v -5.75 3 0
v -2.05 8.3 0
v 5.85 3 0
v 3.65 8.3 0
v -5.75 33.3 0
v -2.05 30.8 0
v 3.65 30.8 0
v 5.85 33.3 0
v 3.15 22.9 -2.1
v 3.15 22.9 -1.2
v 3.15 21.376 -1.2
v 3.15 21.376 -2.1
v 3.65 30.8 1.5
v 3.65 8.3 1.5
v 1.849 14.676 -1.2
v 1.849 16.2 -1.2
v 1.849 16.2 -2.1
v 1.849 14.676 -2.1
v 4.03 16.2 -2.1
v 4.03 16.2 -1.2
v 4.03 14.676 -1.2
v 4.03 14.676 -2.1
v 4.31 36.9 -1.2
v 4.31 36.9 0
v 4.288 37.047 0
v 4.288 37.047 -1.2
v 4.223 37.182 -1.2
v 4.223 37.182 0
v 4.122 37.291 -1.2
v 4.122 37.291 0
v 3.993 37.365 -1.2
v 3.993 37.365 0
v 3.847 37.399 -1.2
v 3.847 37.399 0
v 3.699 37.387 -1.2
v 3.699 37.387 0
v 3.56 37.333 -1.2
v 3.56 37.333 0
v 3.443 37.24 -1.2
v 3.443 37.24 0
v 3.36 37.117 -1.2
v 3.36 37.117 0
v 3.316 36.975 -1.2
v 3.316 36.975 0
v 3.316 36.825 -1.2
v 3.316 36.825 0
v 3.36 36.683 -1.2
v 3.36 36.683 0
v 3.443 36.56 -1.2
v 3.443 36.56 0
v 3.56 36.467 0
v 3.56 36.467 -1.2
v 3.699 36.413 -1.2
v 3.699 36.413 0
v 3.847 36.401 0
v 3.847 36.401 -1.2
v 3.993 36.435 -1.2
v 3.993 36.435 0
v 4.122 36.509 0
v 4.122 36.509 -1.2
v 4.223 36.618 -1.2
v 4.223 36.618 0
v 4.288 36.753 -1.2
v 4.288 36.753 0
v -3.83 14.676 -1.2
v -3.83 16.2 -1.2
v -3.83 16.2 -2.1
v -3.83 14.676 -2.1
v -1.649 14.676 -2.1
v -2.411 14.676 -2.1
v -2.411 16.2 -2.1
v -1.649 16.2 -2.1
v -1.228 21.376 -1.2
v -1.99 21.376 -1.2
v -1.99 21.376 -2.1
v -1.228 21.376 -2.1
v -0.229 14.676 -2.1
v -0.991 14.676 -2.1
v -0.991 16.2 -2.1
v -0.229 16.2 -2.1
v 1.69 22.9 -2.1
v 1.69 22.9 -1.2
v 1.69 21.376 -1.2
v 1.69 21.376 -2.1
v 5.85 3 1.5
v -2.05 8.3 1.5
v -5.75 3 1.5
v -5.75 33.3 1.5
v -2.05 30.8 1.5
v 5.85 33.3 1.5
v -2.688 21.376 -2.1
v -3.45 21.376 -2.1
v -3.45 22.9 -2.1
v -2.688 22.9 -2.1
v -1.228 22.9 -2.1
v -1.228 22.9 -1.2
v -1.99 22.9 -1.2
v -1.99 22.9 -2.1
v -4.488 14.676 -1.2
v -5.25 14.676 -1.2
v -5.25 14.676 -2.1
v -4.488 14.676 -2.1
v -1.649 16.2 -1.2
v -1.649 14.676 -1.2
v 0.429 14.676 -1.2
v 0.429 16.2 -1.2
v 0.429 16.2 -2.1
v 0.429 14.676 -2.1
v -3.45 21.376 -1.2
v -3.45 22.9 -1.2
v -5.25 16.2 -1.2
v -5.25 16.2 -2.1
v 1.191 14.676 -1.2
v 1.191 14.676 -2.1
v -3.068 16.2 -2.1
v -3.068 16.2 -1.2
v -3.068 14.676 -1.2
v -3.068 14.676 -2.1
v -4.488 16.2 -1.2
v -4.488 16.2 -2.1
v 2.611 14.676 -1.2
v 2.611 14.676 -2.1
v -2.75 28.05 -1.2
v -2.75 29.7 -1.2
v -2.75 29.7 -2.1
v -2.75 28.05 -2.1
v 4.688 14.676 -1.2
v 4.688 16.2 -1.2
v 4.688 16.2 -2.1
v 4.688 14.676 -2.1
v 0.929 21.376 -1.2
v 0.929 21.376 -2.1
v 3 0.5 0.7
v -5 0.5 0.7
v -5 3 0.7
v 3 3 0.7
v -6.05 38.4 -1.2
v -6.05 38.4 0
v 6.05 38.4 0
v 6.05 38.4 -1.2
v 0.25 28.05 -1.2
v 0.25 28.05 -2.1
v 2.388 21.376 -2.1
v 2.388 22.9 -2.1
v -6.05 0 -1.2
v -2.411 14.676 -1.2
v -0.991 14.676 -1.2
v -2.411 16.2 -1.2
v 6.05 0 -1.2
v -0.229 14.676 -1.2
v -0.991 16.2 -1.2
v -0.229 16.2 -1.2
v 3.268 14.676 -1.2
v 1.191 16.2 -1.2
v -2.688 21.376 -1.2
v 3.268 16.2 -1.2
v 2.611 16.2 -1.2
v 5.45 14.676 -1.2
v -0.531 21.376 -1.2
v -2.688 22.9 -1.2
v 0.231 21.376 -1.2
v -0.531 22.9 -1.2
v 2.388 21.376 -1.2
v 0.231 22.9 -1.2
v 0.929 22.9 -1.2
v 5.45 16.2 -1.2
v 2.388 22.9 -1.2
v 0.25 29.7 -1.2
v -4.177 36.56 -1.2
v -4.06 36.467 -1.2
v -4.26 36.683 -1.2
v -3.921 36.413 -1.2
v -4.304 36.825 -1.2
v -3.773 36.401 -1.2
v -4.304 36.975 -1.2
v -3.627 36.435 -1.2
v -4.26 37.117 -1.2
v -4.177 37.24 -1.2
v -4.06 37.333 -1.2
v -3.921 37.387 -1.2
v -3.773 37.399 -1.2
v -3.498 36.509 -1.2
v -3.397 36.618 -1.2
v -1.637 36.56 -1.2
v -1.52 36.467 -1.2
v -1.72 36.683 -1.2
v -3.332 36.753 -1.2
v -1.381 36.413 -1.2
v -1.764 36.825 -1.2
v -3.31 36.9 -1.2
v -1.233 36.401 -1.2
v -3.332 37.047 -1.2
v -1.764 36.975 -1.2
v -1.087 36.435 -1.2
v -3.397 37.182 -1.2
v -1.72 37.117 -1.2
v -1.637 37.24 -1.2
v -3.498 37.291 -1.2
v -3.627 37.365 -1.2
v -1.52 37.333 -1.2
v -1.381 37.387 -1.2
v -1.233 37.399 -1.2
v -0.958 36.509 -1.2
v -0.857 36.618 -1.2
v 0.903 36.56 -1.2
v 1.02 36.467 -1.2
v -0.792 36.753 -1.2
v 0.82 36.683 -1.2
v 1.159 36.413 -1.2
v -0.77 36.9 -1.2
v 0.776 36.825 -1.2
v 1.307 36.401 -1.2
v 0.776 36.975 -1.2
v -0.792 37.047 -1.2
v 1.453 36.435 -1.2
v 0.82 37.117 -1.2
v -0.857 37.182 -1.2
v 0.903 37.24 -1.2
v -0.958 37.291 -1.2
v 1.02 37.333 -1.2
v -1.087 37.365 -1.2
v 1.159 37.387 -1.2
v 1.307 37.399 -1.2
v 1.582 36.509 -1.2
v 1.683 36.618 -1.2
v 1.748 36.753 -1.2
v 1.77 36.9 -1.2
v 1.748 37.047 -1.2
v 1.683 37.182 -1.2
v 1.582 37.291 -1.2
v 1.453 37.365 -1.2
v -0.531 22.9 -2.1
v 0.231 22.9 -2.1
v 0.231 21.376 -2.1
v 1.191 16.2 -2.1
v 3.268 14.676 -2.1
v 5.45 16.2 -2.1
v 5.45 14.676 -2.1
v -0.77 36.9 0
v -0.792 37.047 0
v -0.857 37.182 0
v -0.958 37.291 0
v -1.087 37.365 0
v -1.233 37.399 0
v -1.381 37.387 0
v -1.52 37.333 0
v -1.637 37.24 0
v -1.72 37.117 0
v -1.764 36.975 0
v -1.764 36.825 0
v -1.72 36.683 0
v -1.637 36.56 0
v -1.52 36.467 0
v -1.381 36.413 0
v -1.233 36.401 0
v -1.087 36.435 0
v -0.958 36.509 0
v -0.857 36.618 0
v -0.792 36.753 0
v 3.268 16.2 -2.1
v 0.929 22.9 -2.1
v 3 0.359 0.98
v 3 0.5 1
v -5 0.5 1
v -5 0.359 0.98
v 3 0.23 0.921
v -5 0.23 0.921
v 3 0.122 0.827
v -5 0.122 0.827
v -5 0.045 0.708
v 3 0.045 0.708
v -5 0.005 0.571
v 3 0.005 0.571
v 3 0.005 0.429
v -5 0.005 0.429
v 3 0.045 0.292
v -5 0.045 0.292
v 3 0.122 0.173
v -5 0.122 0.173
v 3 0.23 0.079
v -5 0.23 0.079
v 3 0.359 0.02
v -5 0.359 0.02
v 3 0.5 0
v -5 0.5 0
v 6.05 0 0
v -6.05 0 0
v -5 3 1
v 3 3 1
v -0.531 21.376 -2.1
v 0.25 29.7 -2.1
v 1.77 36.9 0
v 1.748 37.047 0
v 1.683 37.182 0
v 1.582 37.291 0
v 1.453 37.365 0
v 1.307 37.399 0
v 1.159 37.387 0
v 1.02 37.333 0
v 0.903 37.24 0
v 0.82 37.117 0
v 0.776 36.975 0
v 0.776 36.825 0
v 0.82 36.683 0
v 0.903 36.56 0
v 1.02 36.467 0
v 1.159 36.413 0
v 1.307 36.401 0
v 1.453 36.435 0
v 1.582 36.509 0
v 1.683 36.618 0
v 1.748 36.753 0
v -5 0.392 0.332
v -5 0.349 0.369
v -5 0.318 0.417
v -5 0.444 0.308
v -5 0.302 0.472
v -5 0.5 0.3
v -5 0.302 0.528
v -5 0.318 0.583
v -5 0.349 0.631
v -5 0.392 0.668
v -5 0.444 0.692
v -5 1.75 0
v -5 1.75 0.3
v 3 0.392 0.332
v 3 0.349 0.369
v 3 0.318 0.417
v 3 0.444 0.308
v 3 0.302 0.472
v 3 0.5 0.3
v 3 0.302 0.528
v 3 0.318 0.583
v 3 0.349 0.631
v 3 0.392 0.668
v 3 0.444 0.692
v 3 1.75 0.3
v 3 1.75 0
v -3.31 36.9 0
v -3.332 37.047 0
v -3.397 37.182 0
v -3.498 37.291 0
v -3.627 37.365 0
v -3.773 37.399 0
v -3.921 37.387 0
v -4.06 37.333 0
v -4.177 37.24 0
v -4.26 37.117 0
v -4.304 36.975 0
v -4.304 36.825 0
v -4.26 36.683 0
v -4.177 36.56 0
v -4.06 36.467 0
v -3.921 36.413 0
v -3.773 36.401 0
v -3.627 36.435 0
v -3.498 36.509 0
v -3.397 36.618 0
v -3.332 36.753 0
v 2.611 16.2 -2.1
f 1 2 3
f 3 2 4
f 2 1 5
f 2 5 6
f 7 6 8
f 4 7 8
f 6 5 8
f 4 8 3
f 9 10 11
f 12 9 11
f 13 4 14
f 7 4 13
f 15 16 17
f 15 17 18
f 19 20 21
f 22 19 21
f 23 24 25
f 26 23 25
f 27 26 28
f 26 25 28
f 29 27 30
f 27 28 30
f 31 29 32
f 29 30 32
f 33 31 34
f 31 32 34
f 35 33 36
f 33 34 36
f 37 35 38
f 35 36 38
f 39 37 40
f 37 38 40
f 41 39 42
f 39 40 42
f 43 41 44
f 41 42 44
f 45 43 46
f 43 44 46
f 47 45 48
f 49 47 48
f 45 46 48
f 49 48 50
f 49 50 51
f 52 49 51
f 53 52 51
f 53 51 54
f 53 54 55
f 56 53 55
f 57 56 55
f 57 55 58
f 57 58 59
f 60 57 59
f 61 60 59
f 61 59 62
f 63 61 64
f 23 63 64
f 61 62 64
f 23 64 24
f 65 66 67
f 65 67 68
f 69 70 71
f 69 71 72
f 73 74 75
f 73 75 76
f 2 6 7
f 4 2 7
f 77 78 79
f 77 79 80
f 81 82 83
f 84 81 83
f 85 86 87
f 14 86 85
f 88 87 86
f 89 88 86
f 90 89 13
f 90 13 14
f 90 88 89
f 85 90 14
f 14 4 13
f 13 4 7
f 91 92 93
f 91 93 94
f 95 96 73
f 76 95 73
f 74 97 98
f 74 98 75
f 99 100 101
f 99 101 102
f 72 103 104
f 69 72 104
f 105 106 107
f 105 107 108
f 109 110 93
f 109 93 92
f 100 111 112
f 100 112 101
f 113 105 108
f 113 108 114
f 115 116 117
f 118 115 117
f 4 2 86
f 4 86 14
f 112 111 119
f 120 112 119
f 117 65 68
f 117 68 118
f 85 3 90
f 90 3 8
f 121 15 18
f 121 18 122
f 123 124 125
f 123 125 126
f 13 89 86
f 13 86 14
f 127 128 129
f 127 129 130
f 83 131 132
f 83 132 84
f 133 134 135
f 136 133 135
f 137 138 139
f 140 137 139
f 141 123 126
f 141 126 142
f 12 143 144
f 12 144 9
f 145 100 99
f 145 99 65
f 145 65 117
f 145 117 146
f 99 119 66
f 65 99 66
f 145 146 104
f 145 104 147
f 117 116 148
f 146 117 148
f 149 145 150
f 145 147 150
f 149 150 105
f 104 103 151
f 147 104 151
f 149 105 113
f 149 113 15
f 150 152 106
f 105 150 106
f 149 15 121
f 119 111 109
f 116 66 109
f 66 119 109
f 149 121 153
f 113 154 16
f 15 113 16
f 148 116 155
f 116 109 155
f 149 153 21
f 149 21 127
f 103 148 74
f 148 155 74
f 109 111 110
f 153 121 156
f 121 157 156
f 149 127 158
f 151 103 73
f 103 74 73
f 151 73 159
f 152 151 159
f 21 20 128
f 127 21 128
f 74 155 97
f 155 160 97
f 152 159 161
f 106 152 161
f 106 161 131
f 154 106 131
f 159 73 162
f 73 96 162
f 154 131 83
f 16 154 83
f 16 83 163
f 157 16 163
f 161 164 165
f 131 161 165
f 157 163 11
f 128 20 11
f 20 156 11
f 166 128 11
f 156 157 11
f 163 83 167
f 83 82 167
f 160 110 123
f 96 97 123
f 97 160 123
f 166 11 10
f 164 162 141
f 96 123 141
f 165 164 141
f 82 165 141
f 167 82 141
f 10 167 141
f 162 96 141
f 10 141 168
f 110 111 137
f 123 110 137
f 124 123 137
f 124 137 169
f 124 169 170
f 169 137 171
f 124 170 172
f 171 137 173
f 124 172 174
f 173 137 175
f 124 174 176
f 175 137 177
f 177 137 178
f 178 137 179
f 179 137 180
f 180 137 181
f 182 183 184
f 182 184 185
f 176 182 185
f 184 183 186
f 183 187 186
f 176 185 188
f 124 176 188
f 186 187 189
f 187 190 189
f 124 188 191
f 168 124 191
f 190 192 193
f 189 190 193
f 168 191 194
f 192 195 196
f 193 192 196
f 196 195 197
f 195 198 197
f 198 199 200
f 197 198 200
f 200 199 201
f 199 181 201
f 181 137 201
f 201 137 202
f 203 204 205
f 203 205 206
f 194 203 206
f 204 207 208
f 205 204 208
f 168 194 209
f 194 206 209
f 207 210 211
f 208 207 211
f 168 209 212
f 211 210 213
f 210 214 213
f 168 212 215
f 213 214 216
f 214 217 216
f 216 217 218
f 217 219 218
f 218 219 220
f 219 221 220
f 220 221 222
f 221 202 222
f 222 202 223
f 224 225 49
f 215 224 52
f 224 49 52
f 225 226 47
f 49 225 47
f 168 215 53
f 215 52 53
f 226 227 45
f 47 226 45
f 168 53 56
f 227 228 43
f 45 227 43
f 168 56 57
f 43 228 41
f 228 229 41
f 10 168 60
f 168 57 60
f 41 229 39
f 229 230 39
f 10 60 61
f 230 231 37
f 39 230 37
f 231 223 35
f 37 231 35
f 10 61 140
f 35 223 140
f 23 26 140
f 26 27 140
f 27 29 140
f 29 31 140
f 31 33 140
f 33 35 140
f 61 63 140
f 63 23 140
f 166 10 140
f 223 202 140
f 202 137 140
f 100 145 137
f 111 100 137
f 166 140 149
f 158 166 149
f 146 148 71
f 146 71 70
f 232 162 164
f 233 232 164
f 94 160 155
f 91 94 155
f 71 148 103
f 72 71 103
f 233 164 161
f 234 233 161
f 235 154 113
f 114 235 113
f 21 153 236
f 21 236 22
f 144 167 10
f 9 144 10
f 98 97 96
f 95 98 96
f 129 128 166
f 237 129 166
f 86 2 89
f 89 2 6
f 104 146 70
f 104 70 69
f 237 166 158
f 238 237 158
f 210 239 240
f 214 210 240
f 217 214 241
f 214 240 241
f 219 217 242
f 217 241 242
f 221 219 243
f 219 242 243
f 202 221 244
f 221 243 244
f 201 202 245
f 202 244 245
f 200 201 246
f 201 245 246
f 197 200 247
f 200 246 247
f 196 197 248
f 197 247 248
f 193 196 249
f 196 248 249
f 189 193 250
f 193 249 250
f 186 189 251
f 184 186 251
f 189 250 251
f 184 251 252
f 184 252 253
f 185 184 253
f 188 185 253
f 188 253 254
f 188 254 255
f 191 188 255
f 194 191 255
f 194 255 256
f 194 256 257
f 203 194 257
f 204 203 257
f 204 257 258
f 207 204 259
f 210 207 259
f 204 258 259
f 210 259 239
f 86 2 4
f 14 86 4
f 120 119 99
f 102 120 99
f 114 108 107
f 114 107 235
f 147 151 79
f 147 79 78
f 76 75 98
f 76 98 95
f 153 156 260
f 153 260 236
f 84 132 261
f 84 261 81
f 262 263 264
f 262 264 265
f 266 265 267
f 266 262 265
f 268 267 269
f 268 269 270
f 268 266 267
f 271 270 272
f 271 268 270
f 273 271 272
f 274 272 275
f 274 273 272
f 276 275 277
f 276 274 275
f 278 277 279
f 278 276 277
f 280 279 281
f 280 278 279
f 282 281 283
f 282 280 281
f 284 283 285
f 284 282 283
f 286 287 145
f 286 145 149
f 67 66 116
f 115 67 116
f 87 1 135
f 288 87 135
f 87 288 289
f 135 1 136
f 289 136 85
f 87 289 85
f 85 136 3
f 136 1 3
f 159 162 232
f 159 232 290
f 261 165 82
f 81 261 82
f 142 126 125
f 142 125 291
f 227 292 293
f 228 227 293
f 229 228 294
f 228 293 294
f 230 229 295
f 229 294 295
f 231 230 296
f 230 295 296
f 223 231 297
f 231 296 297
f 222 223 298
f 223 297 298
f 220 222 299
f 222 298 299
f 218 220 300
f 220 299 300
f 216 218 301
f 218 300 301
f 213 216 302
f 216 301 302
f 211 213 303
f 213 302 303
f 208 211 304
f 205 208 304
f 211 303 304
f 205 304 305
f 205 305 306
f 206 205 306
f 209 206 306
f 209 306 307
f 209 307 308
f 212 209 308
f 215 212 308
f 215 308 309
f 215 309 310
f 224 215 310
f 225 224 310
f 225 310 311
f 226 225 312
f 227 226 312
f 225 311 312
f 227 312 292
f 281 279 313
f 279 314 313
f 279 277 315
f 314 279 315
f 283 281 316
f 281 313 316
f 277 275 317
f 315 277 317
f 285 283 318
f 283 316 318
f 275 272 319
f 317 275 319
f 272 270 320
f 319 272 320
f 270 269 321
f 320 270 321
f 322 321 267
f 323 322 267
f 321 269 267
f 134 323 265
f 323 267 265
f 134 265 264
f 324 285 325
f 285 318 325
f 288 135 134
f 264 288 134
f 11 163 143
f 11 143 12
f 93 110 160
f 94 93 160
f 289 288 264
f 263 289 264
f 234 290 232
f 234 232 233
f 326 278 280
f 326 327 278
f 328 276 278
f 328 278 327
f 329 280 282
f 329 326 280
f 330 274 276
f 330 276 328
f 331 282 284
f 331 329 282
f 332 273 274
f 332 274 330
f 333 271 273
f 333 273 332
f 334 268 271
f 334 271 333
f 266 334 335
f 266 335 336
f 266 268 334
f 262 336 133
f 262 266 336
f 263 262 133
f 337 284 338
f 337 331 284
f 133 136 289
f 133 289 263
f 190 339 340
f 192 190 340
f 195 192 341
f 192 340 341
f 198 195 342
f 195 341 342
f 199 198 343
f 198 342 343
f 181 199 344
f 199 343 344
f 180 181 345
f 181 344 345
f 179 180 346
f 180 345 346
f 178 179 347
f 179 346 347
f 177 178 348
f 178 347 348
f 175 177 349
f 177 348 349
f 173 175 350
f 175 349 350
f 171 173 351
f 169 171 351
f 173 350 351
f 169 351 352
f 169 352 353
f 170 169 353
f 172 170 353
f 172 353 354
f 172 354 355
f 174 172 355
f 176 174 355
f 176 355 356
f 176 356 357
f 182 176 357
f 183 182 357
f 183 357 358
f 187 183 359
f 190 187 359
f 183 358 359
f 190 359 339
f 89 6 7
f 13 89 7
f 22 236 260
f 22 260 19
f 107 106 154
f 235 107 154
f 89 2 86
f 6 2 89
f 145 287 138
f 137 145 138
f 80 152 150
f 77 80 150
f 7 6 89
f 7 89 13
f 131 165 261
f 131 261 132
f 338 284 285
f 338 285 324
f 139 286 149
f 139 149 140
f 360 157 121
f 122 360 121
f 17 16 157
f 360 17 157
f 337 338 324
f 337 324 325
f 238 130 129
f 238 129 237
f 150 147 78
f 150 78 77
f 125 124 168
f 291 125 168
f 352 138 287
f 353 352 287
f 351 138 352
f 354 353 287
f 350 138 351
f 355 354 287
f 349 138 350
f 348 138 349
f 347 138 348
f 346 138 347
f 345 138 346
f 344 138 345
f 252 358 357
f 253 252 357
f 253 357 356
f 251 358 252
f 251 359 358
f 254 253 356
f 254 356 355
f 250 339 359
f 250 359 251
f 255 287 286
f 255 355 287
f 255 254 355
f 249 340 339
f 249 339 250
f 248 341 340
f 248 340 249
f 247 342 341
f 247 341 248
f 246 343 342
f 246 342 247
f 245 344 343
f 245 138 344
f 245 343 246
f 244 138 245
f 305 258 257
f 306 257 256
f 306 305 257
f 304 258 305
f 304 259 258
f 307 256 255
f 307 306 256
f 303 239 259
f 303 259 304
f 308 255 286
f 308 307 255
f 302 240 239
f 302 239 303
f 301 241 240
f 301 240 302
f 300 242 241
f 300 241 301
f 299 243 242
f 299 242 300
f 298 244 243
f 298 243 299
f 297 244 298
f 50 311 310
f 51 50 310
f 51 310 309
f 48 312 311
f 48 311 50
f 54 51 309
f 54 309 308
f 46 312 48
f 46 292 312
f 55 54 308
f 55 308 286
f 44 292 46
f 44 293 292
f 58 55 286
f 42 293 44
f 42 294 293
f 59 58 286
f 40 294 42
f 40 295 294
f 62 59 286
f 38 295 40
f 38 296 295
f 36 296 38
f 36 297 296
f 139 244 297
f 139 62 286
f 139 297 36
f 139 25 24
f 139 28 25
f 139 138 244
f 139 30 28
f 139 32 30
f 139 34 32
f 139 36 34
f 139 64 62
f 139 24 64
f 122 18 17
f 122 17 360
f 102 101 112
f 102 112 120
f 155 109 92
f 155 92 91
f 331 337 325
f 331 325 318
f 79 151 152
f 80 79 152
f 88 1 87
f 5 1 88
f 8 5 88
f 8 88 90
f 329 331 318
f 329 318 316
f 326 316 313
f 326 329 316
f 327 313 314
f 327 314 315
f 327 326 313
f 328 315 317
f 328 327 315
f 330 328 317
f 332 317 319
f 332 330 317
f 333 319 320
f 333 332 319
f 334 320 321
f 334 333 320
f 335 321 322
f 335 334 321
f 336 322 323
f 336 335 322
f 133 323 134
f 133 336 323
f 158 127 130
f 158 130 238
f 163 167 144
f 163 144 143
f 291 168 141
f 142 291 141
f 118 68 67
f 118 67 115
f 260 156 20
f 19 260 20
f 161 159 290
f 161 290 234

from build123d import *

# Parameters (mm, degrees)
F0_W          = 12.1
F0_H          = 38.4
F0_R          = 0.5
F1_DEPTH      = 1.2
F2_W          = 11.6
F2_H          = 30.3
F2_W_2        = 5.7
F2_H_2        = 22.5
F3_DEPTH      = 1.5
F4_DEPTH      = 1.5
F6_DEPTH      = 3
F6_DEPTH_BACK = 5
F7_W          = 0.762
F7_H          = 1.524
F7_W_2        = 3
F7_H_2        = 1.65
F8_DEPTH      = 0.9


with BuildPart() as f1:
    # F0 (on Top) → F1 (new body)
    with BuildSketch(Plane.XY):
        with Locations((0, 19.2)):
            Rectangle(F0_W, F0_H)
        with Locations((-3.81, 36.9)):
            Circle(F0_R, mode=Mode.SUBTRACT)
        with Locations((-1.27, 36.9)):
            Circle(F0_R, mode=Mode.SUBTRACT)
        with Locations((1.27, 36.9)):
            Circle(F0_R, mode=Mode.SUBTRACT)
        with Locations((3.81, 36.9)):
            Circle(F0_R, mode=Mode.SUBTRACT)
    extrude(amount=-F1_DEPTH)

    # F7 (on face) → F8 (join)
    with BuildSketch(Plane(origin=(0, 0, -1.2), x_dir=(1, 0, 0), z_dir=(0, 0, -1))):
        with Locations((5.069, -15.438)):
            Rectangle(F7_W, F7_H)
        with Locations((3.6492857143, -15.438)):
            Rectangle(F7_W, F7_H)
        with Locations((2.2295714286, -15.438)):
            Rectangle(F7_W, F7_H)
        with Locations((0.8098571429, -15.438)):
            Rectangle(F7_W, F7_H)
        with Locations((-0.6098571429, -15.438)):
            Rectangle(F7_W, F7_H)
        with Locations((-2.0295714286, -15.438)):
            Rectangle(F7_W, F7_H)
        with Locations((-1.25, -28.875)):
            Rectangle(F7_W_2, F7_H_2)
        with Locations((-3.4492857143, -15.438)):
            Rectangle(F7_W, F7_H)
        with Locations((-4.869, -15.438)):
            Rectangle(F7_W, F7_H)
        with Locations((2.769, -22.138)):
            Rectangle(F7_W, F7_H)
        with Locations((1.3095, -22.138)):
            Rectangle(F7_W, F7_H)
        with Locations((-0.15, -22.138)):
            Rectangle(F7_W, F7_H)
        with Locations((-1.6095, -22.138)):
            Rectangle(F7_W, F7_H)
        with Locations((-3.069, -22.138)):
            Rectangle(F7_W, F7_H)
    extrude(amount=F8_DEPTH)


with BuildPart() as f3:
    # F2 (on Top) → F3 (new body)
    with BuildSketch(Plane.XY):
        with Locations((0.05, 18.15)):
            Rectangle(F2_W, F2_H)
        with Locations((0.8, 19.55)):
            Rectangle(F2_W_2, F2_H_2, mode=Mode.SUBTRACT)
    extrude(amount=F3_DEPTH)

    # F5 (on Right) → F6 (join, two sides)
    with BuildSketch(Plane.YZ) as f6_sk:
        with BuildLine():
            Line((3, 1), (0.5, 1))
            ThreePointArc((0.5, 1), (0, 0.5), (0.5, 0))
            Line((0.5, 0), (1.7500170507, 0))
            Line((1.7500170507, 0), (1.7500170507, 0.3))
            Line((1.7500170507, 0.3), (0.5, 0.3))
            ThreePointArc((0.5, 0.3), (0.3, 0.5), (0.5, 0.7))
            Line((0.5, 0.7), (3, 0.7))
            Line((3, 0.7), (3, 1))
        make_face()
    extrude(amount=F6_DEPTH)
    extrude(f6_sk.sketch, amount=-F6_DEPTH_BACK)


with BuildPart() as f4:
    # F2 (on Top) → F4 (new body, through all)
    with BuildSketch(Plane.XY):
        with Locations((0.8, 19.55)):
            Rectangle(F2_W_2, F2_H_2)
    extrude(amount=F4_DEPTH)


solid = Compound([f1.part, f3.part, f4.part])
